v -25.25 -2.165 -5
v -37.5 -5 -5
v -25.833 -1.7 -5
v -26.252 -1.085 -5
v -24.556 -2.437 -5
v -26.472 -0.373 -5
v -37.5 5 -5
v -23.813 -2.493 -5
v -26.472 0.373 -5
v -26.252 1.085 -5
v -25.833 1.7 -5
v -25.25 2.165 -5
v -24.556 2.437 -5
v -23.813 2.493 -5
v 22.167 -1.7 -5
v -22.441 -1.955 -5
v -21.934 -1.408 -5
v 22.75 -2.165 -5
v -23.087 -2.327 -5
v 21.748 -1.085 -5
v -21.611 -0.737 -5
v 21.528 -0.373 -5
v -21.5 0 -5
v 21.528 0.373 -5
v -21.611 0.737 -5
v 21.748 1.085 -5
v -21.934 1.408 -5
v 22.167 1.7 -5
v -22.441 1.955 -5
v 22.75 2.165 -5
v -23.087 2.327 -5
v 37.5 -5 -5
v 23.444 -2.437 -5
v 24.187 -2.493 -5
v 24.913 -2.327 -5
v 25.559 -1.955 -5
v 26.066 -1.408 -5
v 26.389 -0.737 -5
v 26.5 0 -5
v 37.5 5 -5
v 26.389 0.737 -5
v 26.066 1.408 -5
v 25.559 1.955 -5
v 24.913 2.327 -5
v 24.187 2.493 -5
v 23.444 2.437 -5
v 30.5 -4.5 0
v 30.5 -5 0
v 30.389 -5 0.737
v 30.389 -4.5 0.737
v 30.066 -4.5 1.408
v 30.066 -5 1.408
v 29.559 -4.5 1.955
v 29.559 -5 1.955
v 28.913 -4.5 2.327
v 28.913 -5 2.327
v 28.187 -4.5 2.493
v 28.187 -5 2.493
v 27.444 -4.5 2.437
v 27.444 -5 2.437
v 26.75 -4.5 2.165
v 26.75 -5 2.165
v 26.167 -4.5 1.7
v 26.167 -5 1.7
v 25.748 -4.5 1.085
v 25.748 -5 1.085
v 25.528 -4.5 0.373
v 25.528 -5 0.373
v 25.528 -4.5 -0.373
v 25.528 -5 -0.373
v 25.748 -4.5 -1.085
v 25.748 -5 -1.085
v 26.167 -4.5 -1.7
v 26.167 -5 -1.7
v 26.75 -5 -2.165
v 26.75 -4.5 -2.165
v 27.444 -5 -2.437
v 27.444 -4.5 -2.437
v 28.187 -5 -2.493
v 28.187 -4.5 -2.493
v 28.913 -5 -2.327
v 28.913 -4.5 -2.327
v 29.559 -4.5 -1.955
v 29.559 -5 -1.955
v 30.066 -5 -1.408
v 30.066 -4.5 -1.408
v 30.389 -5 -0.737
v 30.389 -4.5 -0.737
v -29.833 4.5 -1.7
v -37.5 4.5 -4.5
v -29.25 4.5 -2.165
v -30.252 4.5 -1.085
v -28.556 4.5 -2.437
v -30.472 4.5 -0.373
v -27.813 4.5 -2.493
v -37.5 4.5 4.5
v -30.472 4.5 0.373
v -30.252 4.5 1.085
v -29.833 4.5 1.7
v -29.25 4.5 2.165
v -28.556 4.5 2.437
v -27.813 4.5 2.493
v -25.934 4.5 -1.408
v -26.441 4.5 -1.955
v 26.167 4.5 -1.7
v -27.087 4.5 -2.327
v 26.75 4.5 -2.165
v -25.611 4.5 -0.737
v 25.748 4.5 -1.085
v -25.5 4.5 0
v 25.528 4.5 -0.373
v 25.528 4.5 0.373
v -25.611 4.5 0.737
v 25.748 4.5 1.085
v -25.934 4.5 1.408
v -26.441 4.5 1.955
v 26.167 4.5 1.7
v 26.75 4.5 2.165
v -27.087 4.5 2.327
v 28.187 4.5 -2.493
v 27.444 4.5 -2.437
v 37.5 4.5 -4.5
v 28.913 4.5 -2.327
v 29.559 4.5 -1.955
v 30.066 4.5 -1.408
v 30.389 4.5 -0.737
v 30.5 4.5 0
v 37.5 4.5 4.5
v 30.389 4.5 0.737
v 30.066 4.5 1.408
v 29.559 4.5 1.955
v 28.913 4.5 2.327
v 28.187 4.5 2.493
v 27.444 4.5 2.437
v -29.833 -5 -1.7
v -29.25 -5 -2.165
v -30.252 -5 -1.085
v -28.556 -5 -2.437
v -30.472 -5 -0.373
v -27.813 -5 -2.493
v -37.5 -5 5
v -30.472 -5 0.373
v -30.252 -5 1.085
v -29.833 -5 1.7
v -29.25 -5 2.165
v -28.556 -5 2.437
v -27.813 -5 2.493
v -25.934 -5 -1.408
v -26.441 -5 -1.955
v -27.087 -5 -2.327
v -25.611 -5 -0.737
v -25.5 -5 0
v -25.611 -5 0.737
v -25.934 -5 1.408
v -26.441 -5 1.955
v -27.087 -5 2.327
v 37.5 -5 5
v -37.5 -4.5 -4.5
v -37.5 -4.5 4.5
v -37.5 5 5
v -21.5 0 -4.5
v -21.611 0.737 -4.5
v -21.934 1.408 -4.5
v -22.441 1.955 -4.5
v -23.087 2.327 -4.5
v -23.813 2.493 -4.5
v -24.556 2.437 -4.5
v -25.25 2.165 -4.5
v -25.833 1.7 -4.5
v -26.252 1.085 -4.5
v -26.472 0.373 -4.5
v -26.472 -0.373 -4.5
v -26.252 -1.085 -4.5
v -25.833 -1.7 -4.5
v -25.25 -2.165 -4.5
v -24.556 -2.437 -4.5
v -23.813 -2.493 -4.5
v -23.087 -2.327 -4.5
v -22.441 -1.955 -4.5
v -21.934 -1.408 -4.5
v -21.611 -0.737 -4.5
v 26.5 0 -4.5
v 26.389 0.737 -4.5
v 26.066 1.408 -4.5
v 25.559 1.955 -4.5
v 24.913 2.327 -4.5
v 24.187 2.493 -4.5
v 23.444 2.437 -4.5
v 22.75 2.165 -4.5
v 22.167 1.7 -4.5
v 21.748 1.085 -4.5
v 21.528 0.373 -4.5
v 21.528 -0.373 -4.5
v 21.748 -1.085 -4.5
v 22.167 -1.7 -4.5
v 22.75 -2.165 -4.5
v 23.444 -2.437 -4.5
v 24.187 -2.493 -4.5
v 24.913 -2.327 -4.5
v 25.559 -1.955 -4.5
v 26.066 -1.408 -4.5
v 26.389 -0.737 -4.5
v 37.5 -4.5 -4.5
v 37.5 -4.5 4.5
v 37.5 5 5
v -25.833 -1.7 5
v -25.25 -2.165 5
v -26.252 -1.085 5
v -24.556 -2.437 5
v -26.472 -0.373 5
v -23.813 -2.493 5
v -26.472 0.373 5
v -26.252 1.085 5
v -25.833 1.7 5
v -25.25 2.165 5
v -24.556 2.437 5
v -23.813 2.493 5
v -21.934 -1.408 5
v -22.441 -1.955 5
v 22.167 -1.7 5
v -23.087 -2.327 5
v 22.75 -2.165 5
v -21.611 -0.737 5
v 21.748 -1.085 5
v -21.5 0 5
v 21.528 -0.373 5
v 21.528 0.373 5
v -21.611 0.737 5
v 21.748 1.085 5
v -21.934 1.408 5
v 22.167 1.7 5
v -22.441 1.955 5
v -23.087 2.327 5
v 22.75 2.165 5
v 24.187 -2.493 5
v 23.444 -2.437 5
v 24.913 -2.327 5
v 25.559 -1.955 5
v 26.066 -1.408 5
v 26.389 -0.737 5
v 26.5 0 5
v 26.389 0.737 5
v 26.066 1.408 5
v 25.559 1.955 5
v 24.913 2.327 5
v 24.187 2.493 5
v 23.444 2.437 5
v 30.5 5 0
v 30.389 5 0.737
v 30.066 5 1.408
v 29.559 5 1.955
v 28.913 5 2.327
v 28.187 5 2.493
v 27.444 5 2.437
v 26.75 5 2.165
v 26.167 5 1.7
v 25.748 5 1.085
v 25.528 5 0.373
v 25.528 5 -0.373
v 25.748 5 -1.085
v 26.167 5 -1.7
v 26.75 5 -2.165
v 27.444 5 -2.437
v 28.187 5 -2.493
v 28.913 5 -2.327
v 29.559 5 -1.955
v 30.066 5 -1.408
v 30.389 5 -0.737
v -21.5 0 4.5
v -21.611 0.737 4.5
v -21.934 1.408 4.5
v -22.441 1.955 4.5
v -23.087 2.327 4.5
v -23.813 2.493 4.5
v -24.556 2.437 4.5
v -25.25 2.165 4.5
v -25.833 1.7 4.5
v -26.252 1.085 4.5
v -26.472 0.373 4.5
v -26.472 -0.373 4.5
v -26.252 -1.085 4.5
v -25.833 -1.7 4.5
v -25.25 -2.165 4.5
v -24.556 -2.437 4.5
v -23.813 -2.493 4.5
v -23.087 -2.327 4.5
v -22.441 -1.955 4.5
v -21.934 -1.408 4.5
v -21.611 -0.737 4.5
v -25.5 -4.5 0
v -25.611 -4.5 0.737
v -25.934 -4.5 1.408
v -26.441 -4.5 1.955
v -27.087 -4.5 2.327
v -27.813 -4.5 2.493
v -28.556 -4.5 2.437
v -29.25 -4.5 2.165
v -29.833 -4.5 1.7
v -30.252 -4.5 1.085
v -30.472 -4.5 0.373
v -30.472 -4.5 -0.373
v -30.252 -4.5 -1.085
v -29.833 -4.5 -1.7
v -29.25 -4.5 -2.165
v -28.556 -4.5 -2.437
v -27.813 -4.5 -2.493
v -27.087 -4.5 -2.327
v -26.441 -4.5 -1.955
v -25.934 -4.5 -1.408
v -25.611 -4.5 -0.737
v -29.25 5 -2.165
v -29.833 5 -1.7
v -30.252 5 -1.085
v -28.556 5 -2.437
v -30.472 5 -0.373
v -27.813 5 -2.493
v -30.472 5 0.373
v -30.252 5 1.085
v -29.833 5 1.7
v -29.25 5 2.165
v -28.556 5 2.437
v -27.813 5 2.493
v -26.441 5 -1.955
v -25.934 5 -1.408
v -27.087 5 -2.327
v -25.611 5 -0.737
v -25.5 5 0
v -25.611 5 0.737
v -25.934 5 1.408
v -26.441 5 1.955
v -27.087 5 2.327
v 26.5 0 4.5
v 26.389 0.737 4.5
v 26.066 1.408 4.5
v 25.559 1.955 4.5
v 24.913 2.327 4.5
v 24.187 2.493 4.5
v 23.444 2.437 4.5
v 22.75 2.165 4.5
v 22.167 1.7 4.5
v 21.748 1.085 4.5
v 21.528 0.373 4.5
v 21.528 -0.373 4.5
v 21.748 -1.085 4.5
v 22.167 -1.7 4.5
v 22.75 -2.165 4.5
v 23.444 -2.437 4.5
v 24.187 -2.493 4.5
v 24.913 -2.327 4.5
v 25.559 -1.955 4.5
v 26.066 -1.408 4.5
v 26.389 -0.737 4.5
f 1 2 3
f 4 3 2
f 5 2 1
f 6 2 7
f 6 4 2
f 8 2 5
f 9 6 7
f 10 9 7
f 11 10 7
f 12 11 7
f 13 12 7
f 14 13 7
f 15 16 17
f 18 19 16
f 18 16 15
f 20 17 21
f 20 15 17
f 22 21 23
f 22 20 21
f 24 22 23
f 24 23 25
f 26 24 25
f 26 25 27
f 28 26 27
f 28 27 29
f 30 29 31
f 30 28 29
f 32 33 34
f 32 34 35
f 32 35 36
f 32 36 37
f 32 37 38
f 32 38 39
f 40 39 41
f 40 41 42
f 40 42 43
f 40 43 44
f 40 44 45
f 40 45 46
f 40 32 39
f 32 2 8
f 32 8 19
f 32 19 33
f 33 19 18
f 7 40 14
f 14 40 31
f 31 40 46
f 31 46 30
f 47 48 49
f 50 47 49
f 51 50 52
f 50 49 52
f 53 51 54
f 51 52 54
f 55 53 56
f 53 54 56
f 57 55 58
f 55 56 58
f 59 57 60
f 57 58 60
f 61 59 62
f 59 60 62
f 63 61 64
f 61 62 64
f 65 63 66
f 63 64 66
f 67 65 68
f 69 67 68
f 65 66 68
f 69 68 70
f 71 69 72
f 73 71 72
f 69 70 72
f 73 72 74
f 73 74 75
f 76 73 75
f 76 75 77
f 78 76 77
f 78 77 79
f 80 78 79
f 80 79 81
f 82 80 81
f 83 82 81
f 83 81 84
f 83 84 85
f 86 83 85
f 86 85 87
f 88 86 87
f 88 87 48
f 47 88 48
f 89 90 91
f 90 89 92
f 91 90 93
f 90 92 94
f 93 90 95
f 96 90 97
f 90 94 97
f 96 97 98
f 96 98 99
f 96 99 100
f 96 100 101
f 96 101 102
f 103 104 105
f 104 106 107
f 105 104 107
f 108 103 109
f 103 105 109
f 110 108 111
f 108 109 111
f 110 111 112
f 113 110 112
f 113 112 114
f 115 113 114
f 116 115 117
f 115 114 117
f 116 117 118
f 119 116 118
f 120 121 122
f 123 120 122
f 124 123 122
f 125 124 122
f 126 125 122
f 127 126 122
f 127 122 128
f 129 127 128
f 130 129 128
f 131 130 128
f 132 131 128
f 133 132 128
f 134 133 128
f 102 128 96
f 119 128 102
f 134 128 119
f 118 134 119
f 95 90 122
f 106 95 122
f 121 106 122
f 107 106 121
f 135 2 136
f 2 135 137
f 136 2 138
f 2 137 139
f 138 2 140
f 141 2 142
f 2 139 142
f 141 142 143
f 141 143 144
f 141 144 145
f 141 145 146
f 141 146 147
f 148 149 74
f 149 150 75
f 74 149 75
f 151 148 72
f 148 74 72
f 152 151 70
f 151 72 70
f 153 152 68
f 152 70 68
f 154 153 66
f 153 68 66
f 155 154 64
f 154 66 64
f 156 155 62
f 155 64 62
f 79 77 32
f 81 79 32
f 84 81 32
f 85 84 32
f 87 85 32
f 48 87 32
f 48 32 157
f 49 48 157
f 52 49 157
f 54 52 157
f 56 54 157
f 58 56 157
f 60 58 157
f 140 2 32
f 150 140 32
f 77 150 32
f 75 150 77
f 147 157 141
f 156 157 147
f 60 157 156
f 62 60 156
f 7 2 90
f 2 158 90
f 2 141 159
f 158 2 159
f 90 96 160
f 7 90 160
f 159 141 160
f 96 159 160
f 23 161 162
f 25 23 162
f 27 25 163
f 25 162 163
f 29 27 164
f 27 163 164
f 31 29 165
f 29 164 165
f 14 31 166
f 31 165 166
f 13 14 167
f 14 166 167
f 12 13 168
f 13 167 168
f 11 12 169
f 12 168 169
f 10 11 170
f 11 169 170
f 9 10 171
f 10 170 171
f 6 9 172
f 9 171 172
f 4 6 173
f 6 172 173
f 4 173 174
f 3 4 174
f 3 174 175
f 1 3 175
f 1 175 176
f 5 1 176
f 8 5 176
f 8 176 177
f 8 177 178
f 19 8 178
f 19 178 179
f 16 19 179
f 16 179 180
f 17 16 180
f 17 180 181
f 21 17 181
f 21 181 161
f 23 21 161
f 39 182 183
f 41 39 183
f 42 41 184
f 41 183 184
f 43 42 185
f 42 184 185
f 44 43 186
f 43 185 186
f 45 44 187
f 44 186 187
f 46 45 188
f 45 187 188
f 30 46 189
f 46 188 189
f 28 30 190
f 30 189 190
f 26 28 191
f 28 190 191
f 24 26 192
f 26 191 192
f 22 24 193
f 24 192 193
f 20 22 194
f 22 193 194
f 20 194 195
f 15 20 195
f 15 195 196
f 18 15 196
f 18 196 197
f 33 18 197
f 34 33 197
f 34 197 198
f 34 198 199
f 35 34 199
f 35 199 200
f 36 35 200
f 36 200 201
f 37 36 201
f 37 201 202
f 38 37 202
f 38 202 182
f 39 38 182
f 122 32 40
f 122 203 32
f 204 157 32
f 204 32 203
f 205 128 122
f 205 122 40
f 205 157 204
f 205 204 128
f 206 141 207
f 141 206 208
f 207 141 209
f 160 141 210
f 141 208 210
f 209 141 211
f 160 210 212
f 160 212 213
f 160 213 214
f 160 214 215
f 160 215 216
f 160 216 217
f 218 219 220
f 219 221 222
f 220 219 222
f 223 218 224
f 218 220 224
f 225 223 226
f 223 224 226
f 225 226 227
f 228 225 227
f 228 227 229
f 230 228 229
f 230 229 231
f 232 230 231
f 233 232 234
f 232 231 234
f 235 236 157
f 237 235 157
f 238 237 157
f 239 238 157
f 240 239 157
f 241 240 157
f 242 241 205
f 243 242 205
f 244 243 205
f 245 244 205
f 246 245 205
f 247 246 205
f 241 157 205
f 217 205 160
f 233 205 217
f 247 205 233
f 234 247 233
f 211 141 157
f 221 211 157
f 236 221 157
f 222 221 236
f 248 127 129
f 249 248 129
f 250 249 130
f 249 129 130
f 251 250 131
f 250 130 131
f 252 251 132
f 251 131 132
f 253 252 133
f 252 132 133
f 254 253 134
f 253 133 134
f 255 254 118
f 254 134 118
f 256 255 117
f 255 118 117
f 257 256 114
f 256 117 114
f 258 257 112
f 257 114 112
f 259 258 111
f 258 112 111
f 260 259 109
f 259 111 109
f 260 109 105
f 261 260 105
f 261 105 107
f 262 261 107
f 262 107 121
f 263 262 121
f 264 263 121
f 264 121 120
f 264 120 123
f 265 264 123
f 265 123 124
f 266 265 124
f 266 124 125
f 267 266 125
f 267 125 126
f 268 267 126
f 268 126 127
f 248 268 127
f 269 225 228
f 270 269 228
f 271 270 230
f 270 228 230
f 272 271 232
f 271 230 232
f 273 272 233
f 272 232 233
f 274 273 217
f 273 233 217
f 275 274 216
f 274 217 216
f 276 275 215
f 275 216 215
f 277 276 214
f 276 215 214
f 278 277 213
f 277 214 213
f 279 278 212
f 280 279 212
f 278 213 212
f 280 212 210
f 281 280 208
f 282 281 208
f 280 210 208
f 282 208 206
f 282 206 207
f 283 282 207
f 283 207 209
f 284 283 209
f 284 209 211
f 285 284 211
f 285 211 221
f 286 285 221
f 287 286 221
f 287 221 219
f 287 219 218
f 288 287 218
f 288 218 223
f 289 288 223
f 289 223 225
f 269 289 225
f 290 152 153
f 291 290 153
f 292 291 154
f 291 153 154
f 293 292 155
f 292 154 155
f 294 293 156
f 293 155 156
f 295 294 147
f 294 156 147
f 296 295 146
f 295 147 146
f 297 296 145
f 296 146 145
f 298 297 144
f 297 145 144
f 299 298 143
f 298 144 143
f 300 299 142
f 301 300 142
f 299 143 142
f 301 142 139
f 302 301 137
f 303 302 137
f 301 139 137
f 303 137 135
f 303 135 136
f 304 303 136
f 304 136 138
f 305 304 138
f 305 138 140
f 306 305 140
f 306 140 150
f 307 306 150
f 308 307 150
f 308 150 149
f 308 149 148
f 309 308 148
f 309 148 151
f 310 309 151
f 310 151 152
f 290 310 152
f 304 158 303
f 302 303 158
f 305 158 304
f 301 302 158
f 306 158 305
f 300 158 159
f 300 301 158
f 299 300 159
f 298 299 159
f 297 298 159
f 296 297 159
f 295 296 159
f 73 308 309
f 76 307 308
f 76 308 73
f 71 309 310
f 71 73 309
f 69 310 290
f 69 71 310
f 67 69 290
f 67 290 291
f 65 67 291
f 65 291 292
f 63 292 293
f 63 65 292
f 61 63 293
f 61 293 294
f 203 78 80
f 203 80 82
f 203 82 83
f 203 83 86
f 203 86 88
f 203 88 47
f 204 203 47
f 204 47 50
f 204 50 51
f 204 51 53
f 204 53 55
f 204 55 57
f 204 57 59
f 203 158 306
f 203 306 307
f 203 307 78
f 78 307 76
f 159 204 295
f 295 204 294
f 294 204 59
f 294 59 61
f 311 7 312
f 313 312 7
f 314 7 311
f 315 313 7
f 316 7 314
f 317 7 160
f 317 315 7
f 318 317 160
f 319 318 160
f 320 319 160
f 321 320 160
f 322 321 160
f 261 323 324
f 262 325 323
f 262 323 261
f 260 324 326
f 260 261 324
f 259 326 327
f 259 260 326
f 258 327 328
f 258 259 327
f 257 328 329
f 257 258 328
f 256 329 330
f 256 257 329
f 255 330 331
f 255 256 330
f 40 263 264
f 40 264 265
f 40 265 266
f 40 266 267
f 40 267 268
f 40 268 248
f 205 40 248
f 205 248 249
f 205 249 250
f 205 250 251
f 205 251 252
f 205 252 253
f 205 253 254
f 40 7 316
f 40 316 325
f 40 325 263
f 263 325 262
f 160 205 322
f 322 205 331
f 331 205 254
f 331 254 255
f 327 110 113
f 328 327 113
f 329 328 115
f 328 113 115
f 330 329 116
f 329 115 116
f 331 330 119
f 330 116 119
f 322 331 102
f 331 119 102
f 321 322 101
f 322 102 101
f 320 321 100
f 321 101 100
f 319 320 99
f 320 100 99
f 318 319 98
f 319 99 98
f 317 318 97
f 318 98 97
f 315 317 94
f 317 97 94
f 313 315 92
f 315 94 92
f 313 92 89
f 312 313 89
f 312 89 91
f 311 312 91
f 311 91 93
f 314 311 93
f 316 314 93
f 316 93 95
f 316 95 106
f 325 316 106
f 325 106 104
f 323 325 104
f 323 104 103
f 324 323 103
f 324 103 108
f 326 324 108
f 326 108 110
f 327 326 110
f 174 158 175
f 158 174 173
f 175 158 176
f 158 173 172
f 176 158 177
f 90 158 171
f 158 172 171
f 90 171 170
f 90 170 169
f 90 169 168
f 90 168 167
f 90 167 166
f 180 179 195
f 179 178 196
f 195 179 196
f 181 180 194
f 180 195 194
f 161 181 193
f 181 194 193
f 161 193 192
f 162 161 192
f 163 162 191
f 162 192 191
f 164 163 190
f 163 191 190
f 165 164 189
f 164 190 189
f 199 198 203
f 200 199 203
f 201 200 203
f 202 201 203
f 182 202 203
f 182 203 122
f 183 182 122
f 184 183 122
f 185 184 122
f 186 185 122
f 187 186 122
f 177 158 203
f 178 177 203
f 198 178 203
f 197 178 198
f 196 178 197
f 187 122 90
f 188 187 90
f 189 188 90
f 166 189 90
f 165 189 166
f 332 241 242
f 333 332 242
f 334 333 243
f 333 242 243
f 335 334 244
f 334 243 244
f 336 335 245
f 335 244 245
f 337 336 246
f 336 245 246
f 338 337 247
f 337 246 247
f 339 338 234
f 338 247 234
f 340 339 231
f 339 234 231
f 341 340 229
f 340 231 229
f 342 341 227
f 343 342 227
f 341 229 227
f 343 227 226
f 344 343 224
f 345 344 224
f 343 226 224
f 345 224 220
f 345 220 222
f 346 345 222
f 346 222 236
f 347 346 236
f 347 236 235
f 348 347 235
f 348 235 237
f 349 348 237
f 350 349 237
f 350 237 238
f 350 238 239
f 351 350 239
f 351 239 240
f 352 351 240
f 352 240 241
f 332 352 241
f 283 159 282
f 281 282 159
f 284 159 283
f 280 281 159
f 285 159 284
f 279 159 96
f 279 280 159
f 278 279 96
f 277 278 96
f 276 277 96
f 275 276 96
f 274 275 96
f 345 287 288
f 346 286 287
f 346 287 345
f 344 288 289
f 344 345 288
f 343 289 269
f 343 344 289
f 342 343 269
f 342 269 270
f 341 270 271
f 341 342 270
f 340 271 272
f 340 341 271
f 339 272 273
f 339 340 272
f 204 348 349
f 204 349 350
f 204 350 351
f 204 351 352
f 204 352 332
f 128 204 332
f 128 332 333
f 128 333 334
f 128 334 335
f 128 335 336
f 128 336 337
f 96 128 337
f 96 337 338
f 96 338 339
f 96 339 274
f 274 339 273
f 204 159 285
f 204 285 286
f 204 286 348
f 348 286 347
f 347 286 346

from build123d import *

# Parameters (mm, degrees)
F0_W          = 10
F0_H          = 10
F0_W_2        = 9
F0_H_2        = 9
F1_DEPTH      = 37.5
F1_DEPTH_BACK = 37.5
F2_R          = 2.5
F3_DEPTH      = 10
F4_R          = 2.5
F5_DEPTH      = 10


with BuildPart() as f1:
    # F0 (on Right) → F1 (new body, two sides)
    with BuildSketch(Plane.YZ) as f1_sk:
        Rectangle(F0_W, F0_H)
        Rectangle(F0_W_2, F0_H_2, mode=Mode.SUBTRACT)
    extrude(amount=F1_DEPTH)
    extrude(f1_sk.sketch, amount=-F1_DEPTH_BACK)

    # F2 (on face) → F3 (cut)
    with BuildSketch(Plane.XY.offset(5)):
        with Locations((-24, 0)):
            Circle(F2_R)
        with Locations((24, 0)):
            Circle(F2_R)
    extrude(amount=-F3_DEPTH, mode=Mode.SUBTRACT)

    # F4 (on face) → F5 (cut)
    with BuildSketch(Plane.XZ.offset(5)):
        with Locations((-28, 0)):
            Circle(F4_R)
        with Locations((28, 0)):
            Circle(F4_R)
    extrude(amount=-F5_DEPTH, mode=Mode.SUBTRACT)


solid = f1.part
